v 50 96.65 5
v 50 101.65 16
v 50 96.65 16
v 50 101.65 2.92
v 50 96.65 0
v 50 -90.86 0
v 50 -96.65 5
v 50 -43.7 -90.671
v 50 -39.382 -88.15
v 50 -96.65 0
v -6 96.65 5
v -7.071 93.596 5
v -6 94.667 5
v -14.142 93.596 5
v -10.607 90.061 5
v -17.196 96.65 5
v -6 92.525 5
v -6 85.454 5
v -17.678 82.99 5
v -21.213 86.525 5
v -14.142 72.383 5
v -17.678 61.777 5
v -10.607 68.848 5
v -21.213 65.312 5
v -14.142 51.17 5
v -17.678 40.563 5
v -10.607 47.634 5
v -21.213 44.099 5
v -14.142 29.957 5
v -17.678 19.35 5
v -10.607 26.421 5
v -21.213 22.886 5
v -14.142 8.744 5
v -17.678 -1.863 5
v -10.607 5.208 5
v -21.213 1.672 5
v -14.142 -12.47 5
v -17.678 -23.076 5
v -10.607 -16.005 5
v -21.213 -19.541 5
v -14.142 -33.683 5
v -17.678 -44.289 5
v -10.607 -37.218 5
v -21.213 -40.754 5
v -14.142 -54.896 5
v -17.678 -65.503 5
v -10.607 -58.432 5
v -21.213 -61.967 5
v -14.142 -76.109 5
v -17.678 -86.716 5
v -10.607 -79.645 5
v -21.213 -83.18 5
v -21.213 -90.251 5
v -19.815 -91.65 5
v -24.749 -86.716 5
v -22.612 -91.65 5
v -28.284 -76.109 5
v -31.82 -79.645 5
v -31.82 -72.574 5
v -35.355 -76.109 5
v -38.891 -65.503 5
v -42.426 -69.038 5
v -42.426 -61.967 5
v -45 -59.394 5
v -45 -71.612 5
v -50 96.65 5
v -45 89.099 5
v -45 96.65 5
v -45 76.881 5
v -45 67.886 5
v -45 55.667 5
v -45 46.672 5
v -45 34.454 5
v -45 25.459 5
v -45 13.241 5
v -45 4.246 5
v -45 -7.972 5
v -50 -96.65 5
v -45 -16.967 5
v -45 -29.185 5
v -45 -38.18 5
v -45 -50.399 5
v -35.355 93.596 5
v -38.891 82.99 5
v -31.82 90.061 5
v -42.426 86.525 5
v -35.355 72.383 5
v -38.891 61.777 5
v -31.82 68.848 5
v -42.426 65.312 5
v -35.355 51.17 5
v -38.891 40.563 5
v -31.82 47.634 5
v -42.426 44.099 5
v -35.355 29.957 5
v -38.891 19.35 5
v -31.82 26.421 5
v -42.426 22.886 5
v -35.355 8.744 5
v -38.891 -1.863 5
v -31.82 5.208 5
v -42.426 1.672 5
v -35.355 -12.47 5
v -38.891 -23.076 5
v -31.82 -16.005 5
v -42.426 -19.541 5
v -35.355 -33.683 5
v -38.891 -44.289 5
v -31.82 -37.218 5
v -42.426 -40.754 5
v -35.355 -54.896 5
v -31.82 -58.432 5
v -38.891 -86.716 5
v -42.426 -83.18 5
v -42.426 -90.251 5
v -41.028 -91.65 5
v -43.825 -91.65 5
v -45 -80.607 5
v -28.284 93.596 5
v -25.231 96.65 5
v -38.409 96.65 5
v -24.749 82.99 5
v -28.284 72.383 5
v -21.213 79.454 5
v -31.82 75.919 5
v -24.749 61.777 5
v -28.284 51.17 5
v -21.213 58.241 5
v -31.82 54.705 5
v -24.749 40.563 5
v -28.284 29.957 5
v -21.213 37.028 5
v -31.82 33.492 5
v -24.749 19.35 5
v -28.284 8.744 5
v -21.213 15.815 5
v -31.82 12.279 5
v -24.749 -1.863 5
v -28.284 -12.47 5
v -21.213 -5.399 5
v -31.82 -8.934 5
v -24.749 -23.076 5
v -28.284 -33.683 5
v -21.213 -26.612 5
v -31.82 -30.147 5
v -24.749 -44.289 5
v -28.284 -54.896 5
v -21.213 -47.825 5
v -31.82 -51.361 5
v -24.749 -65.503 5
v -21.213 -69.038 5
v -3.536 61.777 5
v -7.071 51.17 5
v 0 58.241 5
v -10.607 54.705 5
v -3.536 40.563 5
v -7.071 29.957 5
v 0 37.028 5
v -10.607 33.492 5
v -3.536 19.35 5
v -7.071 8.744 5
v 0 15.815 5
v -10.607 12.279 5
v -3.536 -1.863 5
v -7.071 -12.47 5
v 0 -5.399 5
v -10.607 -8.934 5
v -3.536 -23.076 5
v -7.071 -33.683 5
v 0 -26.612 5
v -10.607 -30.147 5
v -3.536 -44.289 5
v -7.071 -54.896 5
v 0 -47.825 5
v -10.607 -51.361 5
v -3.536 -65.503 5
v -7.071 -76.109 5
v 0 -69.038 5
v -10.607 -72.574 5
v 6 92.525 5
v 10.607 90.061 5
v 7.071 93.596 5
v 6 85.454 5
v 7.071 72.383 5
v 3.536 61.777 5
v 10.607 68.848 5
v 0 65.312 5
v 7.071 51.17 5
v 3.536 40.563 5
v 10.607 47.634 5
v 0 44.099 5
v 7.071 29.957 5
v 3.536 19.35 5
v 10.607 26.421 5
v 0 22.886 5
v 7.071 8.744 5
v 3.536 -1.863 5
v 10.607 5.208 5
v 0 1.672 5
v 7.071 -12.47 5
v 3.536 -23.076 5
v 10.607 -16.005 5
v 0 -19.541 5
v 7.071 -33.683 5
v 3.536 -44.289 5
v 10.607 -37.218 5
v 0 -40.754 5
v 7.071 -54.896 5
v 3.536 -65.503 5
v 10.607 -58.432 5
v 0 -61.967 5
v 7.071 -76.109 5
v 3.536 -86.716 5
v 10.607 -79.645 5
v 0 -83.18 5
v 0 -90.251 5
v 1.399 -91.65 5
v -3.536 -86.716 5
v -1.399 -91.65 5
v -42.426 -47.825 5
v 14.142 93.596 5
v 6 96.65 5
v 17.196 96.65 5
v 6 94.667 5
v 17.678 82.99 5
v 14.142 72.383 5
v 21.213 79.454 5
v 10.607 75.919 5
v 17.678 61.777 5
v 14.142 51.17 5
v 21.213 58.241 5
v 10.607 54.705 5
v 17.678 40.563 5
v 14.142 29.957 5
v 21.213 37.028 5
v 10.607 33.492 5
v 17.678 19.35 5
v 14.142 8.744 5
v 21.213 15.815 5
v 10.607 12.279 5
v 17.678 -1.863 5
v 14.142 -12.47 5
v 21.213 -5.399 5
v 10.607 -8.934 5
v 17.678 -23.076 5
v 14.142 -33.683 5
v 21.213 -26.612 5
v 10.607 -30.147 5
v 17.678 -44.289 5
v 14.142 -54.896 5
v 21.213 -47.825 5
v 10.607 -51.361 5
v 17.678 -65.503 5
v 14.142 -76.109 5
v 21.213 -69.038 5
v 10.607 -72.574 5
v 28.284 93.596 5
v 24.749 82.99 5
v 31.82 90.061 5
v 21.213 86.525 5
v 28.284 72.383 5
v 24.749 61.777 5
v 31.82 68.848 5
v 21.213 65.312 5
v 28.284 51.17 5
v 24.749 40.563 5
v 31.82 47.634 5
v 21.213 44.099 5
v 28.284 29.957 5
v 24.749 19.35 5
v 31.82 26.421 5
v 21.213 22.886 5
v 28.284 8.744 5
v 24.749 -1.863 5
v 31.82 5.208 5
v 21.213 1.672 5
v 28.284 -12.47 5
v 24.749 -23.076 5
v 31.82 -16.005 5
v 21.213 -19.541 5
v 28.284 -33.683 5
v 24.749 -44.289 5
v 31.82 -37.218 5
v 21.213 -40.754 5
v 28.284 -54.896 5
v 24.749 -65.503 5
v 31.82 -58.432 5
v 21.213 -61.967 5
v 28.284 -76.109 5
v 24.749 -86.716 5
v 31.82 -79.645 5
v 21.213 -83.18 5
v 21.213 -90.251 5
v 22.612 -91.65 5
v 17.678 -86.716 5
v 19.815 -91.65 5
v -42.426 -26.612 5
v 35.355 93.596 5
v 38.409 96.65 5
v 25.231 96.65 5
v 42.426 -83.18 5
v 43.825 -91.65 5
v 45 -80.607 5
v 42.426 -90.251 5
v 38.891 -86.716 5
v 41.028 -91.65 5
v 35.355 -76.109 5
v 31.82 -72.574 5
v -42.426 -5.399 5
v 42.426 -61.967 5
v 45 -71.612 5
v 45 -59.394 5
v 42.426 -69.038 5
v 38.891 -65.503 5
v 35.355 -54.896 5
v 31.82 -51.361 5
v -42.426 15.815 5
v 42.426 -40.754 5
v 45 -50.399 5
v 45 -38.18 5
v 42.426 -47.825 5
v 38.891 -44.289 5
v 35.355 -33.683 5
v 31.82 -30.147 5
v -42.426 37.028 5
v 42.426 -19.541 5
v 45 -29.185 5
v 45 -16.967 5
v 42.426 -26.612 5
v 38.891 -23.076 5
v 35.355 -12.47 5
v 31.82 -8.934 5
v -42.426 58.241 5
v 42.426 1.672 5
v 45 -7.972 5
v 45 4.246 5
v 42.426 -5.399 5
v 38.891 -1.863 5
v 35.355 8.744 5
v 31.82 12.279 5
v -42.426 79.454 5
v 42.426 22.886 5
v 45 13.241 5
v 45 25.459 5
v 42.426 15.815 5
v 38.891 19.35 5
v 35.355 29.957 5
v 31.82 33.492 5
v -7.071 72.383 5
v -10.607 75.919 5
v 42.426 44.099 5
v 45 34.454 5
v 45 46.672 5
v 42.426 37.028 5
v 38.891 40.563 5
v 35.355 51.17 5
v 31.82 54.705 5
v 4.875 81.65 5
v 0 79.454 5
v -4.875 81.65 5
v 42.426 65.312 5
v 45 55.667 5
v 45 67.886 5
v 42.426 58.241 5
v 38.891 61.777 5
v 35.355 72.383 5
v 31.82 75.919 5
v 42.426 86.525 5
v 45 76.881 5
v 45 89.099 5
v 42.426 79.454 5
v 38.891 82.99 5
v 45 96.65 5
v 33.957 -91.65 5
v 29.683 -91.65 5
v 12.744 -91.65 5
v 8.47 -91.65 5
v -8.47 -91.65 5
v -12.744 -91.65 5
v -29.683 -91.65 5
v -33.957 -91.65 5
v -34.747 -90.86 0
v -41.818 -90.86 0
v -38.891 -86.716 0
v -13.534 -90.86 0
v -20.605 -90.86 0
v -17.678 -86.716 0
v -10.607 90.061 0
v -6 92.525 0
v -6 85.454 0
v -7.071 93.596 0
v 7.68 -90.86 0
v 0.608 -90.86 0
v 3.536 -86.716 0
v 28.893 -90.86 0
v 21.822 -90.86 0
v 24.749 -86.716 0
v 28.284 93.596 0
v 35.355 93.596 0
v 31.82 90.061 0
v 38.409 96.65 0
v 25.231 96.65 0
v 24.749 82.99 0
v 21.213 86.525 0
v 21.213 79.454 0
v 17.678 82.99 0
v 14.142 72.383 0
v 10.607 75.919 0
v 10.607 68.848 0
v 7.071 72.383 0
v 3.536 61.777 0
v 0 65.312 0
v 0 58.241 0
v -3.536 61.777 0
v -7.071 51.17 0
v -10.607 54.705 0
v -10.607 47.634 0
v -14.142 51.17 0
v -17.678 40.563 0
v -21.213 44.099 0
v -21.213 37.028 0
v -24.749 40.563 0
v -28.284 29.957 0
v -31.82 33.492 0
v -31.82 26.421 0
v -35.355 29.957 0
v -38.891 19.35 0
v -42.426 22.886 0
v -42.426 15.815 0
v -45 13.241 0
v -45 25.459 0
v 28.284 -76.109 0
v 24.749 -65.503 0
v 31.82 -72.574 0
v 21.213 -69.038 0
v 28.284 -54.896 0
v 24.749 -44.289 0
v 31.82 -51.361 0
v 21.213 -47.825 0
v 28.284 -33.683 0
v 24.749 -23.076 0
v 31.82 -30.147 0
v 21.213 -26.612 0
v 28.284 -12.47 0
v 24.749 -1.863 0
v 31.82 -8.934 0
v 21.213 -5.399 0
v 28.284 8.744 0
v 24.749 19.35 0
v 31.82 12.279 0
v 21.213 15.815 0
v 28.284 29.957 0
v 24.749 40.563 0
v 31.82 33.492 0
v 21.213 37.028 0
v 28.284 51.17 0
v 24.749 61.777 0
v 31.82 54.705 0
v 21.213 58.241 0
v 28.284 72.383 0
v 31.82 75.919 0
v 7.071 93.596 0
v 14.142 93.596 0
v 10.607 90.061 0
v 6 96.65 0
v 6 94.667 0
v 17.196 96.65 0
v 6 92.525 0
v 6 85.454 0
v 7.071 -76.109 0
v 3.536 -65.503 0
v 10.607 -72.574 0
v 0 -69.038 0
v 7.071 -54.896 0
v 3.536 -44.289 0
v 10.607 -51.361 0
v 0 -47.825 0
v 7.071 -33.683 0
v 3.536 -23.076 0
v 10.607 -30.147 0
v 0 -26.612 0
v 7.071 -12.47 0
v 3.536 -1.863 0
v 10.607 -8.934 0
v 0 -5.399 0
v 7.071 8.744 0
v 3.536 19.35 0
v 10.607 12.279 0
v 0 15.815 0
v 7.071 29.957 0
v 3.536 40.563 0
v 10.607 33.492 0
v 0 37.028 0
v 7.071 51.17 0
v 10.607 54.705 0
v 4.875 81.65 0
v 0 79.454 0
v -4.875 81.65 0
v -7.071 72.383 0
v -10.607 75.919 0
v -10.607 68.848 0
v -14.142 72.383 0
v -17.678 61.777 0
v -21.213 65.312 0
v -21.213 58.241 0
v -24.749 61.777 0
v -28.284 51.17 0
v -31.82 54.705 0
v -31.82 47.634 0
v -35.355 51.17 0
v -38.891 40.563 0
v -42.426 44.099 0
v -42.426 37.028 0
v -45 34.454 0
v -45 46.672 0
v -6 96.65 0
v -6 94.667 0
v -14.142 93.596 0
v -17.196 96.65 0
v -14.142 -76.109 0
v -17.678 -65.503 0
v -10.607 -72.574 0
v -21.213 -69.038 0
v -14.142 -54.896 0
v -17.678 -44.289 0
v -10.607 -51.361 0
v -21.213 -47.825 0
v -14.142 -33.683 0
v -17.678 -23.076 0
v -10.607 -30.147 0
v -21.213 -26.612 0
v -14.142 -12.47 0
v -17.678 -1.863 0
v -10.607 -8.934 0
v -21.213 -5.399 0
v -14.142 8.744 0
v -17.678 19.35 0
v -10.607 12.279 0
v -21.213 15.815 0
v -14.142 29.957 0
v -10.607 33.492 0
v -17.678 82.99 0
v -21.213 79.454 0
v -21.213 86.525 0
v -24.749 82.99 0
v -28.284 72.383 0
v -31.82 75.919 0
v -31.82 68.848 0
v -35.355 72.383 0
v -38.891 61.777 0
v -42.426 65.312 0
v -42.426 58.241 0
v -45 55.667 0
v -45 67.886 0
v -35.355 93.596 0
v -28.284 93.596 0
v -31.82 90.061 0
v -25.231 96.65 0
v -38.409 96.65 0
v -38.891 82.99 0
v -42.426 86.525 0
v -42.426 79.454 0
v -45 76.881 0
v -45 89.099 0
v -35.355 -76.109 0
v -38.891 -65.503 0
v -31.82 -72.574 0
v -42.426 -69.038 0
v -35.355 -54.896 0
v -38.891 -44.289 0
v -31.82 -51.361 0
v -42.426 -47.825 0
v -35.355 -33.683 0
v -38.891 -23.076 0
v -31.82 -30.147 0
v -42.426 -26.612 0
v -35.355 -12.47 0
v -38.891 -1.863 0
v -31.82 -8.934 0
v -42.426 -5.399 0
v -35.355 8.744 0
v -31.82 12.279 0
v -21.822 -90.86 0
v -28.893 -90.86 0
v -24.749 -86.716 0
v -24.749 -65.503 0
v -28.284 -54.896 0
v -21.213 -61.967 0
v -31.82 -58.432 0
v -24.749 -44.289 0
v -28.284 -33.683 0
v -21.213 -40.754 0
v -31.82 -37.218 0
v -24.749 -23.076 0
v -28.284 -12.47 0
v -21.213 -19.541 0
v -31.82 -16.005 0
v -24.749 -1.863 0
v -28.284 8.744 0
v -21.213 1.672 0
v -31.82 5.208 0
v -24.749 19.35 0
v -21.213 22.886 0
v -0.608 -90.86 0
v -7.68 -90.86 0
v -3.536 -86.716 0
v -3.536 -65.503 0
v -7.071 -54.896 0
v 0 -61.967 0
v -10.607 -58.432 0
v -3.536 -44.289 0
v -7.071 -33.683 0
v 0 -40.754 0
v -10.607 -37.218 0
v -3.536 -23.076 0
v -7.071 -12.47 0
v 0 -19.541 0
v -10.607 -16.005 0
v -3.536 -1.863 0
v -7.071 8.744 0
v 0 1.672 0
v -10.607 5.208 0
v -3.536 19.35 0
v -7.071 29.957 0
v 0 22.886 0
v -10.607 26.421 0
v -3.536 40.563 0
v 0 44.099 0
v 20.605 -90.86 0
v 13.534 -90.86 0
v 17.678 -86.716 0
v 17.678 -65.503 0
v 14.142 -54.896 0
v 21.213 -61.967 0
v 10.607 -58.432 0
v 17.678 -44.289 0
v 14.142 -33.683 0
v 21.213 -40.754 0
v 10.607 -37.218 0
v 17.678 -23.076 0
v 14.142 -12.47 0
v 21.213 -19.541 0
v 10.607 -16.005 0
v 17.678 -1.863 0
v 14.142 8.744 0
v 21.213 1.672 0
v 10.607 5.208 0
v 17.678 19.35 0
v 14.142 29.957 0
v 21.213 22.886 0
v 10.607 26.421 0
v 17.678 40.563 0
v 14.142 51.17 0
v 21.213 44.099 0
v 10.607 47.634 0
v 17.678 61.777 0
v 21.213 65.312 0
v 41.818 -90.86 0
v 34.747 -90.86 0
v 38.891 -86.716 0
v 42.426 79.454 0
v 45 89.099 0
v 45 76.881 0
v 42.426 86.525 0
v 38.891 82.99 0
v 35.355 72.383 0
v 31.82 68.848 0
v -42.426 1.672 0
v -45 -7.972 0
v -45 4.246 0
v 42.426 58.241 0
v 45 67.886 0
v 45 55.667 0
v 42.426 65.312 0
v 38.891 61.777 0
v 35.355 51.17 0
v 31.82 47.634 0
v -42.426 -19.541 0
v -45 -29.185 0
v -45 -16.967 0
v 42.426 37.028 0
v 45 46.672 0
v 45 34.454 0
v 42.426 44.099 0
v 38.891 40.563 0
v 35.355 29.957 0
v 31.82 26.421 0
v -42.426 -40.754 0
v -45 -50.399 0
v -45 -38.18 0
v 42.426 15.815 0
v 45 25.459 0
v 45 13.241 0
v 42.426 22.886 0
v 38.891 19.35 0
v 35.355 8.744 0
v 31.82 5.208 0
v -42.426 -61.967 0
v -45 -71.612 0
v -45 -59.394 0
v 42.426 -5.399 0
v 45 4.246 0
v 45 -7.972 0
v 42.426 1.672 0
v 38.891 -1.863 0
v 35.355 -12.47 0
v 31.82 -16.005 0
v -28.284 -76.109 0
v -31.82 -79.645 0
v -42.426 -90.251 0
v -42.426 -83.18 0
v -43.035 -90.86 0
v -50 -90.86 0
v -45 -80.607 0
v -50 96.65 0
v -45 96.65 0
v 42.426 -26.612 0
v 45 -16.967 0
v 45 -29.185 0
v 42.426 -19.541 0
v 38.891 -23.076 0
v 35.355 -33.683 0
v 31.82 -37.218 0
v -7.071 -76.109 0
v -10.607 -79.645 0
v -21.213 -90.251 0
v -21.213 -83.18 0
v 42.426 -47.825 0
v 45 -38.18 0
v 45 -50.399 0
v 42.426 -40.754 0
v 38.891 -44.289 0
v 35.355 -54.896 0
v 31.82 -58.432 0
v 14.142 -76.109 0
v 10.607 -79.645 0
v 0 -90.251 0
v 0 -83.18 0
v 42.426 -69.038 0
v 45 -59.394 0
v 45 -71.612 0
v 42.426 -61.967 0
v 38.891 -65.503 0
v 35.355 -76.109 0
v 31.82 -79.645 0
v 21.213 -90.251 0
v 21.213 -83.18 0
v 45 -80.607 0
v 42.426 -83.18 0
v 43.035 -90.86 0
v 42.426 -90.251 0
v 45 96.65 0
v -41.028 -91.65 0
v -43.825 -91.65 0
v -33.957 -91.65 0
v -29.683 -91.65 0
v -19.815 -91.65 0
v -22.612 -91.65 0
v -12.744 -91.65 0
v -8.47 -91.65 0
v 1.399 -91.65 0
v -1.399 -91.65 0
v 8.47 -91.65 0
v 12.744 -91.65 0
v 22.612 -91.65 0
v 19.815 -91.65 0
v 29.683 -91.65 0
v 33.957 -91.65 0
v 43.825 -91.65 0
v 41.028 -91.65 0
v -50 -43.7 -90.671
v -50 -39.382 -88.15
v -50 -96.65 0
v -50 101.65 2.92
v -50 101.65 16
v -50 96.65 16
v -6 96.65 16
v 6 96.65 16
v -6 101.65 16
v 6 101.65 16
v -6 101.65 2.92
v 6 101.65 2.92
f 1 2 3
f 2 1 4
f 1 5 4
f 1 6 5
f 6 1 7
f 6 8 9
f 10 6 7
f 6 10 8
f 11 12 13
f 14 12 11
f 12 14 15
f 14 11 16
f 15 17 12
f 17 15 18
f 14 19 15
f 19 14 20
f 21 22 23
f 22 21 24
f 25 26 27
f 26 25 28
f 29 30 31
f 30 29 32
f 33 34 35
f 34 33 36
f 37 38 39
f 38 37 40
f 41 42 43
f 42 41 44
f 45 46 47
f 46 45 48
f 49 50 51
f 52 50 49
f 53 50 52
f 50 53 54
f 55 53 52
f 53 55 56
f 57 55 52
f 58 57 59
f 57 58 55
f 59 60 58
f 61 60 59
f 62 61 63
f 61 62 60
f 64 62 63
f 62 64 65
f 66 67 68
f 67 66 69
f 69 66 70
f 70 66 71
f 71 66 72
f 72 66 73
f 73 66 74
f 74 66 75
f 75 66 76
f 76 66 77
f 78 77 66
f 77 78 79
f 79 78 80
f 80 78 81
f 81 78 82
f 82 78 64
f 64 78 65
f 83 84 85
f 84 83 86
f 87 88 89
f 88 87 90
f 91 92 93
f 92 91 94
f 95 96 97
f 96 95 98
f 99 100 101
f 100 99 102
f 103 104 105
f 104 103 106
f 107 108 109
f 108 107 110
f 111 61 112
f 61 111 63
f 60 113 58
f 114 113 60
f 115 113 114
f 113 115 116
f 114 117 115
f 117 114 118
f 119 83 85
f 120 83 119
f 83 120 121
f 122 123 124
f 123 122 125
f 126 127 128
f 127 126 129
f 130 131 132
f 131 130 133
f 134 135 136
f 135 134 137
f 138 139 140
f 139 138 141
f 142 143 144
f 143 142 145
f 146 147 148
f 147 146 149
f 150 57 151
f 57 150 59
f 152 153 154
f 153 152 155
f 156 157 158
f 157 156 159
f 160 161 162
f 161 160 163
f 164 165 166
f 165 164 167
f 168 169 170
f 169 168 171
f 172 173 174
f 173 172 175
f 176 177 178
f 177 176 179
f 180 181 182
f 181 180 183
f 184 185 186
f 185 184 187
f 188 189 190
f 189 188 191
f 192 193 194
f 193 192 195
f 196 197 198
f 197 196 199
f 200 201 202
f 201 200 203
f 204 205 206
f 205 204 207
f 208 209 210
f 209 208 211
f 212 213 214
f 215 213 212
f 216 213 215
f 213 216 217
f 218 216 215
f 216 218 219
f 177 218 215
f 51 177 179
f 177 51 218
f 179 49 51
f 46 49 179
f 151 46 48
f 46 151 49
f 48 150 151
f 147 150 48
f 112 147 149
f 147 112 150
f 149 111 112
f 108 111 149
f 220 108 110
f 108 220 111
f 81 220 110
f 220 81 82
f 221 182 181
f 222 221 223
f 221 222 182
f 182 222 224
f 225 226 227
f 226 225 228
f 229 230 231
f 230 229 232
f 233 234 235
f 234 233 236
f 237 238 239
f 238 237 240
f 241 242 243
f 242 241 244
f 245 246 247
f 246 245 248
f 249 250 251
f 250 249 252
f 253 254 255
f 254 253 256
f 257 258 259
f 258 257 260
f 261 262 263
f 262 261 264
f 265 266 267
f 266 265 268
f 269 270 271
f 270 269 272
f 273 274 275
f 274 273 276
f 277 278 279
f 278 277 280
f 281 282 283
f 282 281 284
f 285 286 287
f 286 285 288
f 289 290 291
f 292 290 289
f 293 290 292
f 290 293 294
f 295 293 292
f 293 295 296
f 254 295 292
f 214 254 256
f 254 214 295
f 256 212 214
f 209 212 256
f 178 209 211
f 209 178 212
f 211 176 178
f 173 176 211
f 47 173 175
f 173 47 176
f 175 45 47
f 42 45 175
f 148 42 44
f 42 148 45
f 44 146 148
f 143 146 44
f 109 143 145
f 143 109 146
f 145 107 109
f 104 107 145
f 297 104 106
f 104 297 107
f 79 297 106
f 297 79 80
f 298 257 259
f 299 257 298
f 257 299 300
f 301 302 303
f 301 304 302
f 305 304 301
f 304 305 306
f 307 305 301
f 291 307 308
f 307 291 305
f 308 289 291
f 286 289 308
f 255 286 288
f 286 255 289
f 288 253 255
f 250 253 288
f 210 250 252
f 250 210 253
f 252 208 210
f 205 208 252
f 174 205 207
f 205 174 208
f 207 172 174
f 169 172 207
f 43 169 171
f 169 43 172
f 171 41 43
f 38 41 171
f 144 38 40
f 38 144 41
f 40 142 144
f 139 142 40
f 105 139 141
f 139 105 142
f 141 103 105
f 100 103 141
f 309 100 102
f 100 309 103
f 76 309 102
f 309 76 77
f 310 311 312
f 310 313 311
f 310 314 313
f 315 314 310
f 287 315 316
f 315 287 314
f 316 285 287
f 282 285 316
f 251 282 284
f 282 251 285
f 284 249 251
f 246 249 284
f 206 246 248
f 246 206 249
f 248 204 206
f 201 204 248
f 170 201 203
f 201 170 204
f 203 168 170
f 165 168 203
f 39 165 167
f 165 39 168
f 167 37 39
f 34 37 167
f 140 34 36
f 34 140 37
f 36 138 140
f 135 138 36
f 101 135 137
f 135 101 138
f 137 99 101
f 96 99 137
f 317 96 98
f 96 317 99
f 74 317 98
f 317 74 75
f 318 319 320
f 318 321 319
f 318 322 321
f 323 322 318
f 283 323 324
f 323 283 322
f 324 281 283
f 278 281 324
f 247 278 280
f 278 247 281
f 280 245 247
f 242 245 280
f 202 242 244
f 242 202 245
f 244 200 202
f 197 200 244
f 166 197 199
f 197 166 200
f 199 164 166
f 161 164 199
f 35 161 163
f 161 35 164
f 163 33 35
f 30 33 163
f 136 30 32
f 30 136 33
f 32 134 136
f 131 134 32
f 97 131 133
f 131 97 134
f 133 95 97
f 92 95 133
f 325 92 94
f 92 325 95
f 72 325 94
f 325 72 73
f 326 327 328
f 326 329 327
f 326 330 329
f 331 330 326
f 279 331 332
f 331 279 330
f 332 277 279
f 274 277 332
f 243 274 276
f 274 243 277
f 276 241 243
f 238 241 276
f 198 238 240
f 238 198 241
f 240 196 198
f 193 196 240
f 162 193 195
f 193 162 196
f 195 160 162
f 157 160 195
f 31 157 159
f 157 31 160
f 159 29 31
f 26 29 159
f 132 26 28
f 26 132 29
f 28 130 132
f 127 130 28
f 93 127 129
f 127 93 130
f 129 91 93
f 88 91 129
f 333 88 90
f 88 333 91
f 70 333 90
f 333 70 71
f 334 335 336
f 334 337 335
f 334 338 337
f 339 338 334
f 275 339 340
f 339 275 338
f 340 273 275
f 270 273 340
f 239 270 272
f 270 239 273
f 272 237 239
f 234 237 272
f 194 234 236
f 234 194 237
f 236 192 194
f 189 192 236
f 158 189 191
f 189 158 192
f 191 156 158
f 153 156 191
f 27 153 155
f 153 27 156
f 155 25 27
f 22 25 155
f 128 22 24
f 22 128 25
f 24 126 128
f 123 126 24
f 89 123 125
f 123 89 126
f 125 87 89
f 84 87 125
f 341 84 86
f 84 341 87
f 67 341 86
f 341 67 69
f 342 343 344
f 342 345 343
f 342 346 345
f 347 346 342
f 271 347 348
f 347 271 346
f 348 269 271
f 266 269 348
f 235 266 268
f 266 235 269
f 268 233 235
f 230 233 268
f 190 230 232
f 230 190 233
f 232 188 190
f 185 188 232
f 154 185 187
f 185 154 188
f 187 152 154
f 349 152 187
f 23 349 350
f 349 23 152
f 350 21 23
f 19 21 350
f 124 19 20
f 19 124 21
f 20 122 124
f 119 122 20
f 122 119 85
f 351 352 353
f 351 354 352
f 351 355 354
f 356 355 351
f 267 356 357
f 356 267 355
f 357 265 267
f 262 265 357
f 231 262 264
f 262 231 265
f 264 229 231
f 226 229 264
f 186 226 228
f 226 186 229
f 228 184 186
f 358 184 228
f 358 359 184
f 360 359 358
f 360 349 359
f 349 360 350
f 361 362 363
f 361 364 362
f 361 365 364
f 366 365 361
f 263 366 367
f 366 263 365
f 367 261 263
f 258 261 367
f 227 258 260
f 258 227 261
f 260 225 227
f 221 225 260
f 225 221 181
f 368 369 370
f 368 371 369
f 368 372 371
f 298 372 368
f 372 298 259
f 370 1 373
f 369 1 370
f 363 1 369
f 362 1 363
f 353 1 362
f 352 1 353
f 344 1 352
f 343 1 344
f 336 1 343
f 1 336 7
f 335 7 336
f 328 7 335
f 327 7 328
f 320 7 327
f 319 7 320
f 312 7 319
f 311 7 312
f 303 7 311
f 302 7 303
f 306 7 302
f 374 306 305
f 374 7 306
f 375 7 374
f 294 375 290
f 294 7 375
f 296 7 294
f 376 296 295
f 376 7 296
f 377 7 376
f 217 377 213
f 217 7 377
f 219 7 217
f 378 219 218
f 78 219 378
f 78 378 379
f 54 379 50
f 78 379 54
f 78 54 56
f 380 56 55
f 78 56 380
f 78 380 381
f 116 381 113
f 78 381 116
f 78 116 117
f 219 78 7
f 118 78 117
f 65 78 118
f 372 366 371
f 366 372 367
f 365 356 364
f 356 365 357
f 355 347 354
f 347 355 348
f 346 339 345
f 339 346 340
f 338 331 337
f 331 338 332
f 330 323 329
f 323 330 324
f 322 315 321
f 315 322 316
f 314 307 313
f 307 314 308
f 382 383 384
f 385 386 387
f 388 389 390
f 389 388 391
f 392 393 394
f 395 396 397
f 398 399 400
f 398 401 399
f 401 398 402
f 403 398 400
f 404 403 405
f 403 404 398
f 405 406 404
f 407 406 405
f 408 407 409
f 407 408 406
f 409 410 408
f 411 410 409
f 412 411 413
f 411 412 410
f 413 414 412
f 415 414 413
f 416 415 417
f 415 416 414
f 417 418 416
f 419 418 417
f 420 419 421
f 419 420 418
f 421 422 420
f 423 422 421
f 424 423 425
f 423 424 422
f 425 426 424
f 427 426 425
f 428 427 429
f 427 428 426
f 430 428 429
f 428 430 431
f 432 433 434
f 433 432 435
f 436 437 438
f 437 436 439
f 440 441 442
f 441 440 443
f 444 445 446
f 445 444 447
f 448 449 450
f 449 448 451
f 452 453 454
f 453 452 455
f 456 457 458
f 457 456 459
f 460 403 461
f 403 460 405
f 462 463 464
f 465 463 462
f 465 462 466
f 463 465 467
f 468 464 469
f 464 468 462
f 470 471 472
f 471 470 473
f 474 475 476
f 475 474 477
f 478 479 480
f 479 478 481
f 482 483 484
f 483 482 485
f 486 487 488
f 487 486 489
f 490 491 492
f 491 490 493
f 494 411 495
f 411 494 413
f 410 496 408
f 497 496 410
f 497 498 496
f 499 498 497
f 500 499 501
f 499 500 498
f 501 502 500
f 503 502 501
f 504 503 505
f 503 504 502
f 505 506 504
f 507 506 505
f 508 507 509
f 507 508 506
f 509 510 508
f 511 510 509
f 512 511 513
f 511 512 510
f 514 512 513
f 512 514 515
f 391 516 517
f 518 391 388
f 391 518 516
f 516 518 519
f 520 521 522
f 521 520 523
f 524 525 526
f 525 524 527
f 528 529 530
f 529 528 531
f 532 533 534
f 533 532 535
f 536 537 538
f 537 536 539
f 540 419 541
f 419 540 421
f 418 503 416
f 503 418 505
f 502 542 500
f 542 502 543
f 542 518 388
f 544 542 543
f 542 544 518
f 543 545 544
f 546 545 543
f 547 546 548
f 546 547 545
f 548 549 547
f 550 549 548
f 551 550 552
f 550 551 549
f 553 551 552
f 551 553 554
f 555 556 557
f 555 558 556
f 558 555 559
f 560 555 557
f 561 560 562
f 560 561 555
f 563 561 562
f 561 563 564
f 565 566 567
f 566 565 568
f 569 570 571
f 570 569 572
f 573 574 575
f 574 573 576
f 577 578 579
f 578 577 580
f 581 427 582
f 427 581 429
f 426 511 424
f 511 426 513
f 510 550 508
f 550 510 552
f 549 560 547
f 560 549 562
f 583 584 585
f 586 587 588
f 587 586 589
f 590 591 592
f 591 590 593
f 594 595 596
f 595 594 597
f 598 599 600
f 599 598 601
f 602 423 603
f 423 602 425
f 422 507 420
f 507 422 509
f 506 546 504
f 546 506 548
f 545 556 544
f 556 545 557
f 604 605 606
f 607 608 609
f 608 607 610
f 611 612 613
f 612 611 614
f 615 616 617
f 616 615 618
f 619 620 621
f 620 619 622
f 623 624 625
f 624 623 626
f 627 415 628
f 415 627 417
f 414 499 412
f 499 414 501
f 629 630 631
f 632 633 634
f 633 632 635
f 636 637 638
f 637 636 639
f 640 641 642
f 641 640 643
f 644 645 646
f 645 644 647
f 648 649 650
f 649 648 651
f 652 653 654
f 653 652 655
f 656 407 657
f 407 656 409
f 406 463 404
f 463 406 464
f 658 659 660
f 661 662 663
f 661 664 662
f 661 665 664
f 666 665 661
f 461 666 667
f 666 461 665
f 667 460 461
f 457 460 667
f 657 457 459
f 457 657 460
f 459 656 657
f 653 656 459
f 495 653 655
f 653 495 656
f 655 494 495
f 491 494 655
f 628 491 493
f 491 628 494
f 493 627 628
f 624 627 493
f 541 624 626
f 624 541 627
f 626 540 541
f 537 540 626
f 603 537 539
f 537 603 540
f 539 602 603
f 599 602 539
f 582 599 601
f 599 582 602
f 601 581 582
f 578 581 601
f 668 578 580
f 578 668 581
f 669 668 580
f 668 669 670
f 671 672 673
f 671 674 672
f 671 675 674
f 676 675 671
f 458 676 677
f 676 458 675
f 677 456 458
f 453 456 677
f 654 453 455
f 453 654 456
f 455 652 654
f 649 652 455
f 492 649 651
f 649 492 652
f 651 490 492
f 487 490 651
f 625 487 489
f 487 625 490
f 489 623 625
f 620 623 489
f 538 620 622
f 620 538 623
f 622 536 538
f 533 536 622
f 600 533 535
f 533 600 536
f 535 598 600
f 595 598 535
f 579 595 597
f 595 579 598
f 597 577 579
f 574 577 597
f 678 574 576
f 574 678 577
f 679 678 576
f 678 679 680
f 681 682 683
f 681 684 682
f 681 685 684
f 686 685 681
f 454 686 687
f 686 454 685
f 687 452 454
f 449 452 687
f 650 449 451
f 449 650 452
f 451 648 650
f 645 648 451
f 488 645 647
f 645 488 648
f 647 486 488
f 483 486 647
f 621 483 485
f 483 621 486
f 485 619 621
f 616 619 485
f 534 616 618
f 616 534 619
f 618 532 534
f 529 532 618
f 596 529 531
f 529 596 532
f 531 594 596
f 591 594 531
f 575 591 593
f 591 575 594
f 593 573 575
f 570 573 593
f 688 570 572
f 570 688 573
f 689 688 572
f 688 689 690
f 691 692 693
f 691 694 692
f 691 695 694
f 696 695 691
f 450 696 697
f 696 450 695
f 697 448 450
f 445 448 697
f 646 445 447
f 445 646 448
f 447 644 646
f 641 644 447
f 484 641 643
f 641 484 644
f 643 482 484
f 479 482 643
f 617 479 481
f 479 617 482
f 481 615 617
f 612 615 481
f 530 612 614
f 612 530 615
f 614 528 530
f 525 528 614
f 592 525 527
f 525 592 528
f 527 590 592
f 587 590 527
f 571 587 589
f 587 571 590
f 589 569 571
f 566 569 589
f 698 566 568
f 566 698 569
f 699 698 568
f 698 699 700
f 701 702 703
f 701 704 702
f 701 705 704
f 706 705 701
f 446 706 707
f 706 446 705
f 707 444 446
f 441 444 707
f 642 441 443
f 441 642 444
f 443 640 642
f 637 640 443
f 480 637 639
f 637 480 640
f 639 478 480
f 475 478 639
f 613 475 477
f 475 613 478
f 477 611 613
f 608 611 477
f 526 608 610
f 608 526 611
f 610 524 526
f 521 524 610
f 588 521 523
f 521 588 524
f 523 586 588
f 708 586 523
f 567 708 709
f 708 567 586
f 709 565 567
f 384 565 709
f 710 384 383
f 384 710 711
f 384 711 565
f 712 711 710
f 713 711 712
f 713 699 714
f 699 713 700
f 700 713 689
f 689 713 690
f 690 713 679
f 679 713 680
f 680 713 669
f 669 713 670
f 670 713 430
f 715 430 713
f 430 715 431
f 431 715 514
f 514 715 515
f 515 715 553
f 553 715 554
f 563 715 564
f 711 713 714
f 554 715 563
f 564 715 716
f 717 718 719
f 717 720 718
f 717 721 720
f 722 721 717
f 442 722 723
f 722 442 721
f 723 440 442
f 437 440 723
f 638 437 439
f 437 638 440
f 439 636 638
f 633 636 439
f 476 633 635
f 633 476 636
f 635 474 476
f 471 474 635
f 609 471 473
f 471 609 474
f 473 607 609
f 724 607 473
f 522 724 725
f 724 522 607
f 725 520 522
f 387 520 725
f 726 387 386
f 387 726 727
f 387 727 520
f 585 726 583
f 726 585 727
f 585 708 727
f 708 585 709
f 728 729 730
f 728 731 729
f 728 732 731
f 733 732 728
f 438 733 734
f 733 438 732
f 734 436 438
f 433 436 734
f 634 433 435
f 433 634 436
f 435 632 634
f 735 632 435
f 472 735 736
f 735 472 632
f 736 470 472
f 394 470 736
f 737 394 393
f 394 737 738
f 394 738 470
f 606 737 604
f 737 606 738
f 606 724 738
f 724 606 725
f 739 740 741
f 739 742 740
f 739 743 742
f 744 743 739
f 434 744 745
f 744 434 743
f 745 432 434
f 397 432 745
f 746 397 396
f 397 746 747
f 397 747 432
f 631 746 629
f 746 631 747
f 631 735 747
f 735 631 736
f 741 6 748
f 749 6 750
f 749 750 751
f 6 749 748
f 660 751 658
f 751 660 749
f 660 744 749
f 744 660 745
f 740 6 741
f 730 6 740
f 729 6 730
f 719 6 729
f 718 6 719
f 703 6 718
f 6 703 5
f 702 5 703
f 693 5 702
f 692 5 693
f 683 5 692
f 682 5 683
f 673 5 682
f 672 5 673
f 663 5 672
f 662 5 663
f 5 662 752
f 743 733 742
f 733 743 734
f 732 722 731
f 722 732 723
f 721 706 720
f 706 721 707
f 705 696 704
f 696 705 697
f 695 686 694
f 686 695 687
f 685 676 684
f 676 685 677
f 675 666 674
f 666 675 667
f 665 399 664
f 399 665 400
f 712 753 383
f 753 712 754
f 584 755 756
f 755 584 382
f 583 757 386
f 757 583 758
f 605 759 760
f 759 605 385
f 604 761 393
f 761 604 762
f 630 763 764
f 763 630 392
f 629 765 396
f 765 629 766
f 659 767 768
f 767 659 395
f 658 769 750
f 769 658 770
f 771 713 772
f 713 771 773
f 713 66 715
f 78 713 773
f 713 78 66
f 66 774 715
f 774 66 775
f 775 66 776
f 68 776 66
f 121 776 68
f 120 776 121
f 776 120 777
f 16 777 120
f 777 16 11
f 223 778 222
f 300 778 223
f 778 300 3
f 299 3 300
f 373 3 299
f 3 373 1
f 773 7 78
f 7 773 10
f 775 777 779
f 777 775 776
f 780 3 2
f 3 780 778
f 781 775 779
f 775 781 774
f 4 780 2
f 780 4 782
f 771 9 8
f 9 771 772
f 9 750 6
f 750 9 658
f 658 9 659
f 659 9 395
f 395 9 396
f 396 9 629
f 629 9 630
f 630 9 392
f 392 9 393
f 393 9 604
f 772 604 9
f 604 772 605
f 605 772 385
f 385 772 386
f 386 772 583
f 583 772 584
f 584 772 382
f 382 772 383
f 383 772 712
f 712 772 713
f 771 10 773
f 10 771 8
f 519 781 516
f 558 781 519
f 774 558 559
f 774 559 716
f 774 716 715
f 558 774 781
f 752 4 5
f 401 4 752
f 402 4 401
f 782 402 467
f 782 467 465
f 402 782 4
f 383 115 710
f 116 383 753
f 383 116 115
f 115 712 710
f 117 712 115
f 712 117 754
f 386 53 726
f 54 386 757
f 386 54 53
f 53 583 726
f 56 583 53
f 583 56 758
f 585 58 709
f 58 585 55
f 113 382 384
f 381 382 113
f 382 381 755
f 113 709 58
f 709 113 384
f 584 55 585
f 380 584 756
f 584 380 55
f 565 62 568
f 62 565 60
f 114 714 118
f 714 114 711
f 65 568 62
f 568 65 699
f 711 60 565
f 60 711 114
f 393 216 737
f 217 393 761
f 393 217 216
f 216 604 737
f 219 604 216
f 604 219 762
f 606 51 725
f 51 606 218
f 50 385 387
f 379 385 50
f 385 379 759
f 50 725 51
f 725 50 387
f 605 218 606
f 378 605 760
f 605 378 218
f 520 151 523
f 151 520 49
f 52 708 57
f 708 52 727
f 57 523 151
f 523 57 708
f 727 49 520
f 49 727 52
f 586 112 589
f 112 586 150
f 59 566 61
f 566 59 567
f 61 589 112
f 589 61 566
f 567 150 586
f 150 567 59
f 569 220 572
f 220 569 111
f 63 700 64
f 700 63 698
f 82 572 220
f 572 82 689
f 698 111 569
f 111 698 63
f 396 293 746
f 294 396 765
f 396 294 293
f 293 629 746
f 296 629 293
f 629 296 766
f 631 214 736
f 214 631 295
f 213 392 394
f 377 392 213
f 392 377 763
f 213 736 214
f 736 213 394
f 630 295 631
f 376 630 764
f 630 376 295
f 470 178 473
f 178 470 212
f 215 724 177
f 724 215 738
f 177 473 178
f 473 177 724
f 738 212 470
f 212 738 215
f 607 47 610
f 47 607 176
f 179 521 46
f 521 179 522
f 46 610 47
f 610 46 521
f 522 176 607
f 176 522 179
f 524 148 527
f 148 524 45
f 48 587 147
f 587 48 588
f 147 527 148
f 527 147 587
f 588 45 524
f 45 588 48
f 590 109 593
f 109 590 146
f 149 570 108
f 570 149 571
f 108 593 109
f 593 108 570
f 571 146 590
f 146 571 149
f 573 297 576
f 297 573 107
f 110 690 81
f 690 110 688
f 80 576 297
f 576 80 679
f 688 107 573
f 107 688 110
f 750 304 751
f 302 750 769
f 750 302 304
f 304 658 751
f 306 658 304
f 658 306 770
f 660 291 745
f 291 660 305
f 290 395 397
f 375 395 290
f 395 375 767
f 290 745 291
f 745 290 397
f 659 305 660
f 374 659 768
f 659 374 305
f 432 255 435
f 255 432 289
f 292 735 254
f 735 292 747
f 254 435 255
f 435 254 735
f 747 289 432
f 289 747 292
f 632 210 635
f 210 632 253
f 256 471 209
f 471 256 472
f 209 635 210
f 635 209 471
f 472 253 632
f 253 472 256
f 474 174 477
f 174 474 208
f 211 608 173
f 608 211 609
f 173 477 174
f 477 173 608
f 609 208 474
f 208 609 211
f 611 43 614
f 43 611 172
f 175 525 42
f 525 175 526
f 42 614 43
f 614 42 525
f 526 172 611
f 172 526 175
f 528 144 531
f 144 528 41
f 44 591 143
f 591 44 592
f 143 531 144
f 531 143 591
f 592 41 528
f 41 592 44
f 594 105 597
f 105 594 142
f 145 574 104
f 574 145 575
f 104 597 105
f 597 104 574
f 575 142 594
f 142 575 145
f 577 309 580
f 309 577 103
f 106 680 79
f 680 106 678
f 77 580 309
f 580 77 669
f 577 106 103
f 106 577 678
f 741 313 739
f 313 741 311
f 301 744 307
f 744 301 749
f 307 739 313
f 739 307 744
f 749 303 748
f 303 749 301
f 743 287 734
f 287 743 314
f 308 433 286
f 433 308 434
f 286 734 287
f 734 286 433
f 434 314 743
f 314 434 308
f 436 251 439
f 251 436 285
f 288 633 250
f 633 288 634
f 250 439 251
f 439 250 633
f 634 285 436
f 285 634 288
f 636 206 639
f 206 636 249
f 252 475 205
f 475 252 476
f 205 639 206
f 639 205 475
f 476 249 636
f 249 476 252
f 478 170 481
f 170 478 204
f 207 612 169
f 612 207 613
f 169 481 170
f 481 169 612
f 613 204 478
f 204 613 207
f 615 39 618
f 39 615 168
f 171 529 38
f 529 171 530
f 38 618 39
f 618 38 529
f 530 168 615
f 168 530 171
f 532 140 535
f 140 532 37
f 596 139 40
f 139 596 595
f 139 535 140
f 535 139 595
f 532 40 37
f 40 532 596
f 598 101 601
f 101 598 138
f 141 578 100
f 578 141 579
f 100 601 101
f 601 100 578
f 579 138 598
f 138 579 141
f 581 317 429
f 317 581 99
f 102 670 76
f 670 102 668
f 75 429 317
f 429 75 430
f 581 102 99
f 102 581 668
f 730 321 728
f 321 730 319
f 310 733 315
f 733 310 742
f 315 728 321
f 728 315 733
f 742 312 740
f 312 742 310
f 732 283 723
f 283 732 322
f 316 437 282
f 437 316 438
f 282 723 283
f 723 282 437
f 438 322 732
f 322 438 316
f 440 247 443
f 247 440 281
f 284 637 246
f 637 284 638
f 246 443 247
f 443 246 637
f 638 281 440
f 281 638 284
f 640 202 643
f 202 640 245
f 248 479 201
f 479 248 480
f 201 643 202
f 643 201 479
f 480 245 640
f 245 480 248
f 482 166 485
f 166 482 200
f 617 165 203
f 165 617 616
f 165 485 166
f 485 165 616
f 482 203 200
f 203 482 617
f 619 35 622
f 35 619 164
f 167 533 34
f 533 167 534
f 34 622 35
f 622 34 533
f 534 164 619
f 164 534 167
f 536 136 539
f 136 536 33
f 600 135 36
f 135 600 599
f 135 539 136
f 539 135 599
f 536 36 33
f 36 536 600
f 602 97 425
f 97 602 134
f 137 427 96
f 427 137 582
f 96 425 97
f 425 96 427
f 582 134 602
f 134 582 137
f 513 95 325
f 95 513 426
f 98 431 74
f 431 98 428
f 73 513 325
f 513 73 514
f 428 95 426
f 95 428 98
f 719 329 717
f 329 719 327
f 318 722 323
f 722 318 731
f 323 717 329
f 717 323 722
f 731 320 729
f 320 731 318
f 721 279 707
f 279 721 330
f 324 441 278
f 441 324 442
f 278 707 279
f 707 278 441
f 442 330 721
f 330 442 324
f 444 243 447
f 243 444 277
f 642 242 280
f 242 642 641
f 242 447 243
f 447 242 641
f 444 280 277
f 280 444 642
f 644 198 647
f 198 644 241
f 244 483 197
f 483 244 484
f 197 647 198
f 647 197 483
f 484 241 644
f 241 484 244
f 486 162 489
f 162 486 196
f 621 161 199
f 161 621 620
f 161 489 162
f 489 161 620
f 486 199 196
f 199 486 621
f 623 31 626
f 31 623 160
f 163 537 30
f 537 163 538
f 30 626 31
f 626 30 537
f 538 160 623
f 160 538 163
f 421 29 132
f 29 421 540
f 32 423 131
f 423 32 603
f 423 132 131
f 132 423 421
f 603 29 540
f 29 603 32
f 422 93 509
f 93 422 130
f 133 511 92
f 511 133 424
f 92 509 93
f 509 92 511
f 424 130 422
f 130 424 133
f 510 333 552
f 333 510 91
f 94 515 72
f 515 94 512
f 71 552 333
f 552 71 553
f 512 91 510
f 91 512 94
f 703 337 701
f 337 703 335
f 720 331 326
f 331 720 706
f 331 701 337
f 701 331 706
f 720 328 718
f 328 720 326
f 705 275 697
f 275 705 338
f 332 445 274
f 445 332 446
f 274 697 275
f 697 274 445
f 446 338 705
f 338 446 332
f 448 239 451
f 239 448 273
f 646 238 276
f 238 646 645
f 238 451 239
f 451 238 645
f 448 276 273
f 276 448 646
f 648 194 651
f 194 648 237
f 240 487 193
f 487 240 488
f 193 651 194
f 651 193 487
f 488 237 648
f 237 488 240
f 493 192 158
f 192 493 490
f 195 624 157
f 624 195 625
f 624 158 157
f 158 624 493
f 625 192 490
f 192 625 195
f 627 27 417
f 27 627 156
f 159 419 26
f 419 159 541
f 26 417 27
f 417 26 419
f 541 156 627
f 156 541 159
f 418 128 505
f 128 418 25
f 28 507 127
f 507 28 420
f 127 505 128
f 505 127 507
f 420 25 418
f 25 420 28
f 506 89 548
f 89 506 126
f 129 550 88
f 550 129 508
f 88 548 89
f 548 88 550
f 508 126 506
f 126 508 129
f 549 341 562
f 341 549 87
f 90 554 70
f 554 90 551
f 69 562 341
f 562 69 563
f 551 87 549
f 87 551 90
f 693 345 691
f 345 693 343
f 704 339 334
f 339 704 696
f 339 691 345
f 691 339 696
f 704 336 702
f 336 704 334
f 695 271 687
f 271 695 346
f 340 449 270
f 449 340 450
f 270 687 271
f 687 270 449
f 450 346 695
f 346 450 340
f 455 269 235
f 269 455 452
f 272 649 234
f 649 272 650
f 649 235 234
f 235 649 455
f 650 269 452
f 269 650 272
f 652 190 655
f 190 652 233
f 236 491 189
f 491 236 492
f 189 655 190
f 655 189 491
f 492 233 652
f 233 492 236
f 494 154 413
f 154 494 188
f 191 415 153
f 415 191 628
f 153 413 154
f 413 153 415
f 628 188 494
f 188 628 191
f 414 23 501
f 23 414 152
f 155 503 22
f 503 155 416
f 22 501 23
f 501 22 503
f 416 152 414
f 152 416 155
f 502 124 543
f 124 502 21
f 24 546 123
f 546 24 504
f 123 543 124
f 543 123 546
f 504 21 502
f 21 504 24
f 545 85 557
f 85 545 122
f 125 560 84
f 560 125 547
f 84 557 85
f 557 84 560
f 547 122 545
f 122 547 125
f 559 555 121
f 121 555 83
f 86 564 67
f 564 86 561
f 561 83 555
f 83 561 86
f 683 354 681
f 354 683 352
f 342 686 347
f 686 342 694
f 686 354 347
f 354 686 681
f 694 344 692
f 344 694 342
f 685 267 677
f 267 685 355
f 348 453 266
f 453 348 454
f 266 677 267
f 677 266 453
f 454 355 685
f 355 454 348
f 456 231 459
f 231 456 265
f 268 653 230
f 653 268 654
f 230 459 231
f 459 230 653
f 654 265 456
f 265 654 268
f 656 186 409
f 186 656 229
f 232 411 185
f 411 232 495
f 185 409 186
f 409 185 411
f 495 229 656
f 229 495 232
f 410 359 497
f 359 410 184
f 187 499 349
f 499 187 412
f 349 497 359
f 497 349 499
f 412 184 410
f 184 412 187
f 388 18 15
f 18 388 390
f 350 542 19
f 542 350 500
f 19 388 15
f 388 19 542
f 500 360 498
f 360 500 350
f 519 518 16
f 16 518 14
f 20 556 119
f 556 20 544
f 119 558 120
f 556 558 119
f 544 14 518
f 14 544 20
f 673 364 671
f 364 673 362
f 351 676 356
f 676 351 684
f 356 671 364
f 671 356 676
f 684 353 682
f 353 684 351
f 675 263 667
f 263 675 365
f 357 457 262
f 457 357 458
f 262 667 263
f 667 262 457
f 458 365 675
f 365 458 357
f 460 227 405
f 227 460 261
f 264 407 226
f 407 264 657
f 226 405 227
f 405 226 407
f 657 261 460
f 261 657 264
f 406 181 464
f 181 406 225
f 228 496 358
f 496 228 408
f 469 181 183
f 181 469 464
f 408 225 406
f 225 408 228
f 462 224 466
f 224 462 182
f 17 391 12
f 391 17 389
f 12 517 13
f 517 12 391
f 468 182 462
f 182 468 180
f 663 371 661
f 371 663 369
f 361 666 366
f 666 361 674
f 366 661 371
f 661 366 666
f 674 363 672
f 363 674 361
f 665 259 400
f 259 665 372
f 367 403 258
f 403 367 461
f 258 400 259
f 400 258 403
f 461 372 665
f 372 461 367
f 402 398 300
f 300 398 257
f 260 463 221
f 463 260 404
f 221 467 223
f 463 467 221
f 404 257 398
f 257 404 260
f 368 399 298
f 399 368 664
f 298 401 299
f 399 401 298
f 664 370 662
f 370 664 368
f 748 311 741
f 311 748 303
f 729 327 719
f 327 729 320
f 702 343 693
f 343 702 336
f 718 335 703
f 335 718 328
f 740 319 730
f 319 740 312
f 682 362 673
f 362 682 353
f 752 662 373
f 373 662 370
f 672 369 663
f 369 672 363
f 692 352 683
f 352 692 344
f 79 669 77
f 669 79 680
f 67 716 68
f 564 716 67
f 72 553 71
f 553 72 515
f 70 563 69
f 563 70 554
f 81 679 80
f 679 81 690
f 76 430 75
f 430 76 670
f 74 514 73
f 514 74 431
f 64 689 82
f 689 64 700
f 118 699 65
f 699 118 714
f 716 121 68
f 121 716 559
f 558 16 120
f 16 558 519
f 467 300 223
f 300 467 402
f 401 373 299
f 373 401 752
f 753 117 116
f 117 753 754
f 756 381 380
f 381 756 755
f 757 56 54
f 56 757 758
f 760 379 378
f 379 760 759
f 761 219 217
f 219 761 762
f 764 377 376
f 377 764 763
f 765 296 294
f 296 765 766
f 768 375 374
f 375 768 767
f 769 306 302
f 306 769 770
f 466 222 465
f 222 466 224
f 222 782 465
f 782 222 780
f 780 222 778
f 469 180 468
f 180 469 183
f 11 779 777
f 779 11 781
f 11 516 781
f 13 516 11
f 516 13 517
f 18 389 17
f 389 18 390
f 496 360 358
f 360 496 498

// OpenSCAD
length              = 193.3;
width               = 100;
height              = 100;
gutter              = 11;
tickness            = 5;
patternAngle        = 45;
patternLength       = 10;
patternWidth        = 10;
makePattern         = true;
makeConnectorHole   = true;

module support () {
    inclined = height > length / 2;
    tanAngle = atan((length+tickness)/height);
    cosAngle = acos(height/(length+tickness));
    sinAngle = asin(height/(length+tickness));
    
    translate([-width/2, -length/2, 0]) {
        difference() {
            union() {
                cube([width, length, tickness], 0);
                translate([0, length, 0]) {
                    cube([width, tickness, gutter + tickness], 0);
                }
                rotate([inclined ? sinAngle : 0 , 0, 0]) {   
                    difference() {
                        translate([0, 0, -height-tickness]) {
                            cube([width, tickness, height+tickness], 0);
                        }
  
                        if (!inclined) {
                            translate([-1, -tickness/2 , -height])
                            rotate([-tanAngle, 0, 0])
                            cube([width+2, tickness*2, tickness*2], 0);
                        }
                    }
                }
            }
            
            translate([-1, length, 0]) {
                rotate([inclined ? -cosAngle : -tanAngle, 0, 0]) {
                    cube([width+2, tickness, tickness*10]);
                }
            }
        }
    }
}

module connectorHole() {
    difference () {   
        translate([-6, length/2 - tickness * 3, 0]) {
            cube([12, tickness*4, gutter + tickness], 0);
        }
    }
}

module pattern() {
    diagonal = sqrt(pow(width, 2) + pow(length, 2));

    difference() {
        // create rectangle pattern
        rotate([0, 0, patternAngle]) {
            translate([-diagonal/2, -diagonal/2, 0]){
                cols = floor(diagonal / (patternLength + tickness)) - 1;
                lines = floor(diagonal / (patternWidth + tickness)) - 1;
                for(x = [0:cols], y = [0:lines]) {
                    translate([tickness + (x * (patternLength + tickness)), tickness + ( y * (patternWidth + tickness)), 0]) {
                        cube([patternLength, patternWidth, tickness], 0);
                    }
                }
            }
        }
        
        // create hole structure for the main diff
        difference() { 
            rotate([0, 0, patternAngle]) { 
                translate([-diagonal/2, -diagonal/2, -tickness]){
                        cube([diagonal, diagonal, tickness * 3], 0);
                }
            }
            translate([-width/2 + tickness, -length/2 + tickness, -tickness*2]) {
                cube([width - (tickness * 2), length - tickness, tickness*5], 0);
            }
        }
    }
}


difference(){
    support();
    if (makePattern) pattern();
    if (makeConnectorHole) connectorHole();
}
